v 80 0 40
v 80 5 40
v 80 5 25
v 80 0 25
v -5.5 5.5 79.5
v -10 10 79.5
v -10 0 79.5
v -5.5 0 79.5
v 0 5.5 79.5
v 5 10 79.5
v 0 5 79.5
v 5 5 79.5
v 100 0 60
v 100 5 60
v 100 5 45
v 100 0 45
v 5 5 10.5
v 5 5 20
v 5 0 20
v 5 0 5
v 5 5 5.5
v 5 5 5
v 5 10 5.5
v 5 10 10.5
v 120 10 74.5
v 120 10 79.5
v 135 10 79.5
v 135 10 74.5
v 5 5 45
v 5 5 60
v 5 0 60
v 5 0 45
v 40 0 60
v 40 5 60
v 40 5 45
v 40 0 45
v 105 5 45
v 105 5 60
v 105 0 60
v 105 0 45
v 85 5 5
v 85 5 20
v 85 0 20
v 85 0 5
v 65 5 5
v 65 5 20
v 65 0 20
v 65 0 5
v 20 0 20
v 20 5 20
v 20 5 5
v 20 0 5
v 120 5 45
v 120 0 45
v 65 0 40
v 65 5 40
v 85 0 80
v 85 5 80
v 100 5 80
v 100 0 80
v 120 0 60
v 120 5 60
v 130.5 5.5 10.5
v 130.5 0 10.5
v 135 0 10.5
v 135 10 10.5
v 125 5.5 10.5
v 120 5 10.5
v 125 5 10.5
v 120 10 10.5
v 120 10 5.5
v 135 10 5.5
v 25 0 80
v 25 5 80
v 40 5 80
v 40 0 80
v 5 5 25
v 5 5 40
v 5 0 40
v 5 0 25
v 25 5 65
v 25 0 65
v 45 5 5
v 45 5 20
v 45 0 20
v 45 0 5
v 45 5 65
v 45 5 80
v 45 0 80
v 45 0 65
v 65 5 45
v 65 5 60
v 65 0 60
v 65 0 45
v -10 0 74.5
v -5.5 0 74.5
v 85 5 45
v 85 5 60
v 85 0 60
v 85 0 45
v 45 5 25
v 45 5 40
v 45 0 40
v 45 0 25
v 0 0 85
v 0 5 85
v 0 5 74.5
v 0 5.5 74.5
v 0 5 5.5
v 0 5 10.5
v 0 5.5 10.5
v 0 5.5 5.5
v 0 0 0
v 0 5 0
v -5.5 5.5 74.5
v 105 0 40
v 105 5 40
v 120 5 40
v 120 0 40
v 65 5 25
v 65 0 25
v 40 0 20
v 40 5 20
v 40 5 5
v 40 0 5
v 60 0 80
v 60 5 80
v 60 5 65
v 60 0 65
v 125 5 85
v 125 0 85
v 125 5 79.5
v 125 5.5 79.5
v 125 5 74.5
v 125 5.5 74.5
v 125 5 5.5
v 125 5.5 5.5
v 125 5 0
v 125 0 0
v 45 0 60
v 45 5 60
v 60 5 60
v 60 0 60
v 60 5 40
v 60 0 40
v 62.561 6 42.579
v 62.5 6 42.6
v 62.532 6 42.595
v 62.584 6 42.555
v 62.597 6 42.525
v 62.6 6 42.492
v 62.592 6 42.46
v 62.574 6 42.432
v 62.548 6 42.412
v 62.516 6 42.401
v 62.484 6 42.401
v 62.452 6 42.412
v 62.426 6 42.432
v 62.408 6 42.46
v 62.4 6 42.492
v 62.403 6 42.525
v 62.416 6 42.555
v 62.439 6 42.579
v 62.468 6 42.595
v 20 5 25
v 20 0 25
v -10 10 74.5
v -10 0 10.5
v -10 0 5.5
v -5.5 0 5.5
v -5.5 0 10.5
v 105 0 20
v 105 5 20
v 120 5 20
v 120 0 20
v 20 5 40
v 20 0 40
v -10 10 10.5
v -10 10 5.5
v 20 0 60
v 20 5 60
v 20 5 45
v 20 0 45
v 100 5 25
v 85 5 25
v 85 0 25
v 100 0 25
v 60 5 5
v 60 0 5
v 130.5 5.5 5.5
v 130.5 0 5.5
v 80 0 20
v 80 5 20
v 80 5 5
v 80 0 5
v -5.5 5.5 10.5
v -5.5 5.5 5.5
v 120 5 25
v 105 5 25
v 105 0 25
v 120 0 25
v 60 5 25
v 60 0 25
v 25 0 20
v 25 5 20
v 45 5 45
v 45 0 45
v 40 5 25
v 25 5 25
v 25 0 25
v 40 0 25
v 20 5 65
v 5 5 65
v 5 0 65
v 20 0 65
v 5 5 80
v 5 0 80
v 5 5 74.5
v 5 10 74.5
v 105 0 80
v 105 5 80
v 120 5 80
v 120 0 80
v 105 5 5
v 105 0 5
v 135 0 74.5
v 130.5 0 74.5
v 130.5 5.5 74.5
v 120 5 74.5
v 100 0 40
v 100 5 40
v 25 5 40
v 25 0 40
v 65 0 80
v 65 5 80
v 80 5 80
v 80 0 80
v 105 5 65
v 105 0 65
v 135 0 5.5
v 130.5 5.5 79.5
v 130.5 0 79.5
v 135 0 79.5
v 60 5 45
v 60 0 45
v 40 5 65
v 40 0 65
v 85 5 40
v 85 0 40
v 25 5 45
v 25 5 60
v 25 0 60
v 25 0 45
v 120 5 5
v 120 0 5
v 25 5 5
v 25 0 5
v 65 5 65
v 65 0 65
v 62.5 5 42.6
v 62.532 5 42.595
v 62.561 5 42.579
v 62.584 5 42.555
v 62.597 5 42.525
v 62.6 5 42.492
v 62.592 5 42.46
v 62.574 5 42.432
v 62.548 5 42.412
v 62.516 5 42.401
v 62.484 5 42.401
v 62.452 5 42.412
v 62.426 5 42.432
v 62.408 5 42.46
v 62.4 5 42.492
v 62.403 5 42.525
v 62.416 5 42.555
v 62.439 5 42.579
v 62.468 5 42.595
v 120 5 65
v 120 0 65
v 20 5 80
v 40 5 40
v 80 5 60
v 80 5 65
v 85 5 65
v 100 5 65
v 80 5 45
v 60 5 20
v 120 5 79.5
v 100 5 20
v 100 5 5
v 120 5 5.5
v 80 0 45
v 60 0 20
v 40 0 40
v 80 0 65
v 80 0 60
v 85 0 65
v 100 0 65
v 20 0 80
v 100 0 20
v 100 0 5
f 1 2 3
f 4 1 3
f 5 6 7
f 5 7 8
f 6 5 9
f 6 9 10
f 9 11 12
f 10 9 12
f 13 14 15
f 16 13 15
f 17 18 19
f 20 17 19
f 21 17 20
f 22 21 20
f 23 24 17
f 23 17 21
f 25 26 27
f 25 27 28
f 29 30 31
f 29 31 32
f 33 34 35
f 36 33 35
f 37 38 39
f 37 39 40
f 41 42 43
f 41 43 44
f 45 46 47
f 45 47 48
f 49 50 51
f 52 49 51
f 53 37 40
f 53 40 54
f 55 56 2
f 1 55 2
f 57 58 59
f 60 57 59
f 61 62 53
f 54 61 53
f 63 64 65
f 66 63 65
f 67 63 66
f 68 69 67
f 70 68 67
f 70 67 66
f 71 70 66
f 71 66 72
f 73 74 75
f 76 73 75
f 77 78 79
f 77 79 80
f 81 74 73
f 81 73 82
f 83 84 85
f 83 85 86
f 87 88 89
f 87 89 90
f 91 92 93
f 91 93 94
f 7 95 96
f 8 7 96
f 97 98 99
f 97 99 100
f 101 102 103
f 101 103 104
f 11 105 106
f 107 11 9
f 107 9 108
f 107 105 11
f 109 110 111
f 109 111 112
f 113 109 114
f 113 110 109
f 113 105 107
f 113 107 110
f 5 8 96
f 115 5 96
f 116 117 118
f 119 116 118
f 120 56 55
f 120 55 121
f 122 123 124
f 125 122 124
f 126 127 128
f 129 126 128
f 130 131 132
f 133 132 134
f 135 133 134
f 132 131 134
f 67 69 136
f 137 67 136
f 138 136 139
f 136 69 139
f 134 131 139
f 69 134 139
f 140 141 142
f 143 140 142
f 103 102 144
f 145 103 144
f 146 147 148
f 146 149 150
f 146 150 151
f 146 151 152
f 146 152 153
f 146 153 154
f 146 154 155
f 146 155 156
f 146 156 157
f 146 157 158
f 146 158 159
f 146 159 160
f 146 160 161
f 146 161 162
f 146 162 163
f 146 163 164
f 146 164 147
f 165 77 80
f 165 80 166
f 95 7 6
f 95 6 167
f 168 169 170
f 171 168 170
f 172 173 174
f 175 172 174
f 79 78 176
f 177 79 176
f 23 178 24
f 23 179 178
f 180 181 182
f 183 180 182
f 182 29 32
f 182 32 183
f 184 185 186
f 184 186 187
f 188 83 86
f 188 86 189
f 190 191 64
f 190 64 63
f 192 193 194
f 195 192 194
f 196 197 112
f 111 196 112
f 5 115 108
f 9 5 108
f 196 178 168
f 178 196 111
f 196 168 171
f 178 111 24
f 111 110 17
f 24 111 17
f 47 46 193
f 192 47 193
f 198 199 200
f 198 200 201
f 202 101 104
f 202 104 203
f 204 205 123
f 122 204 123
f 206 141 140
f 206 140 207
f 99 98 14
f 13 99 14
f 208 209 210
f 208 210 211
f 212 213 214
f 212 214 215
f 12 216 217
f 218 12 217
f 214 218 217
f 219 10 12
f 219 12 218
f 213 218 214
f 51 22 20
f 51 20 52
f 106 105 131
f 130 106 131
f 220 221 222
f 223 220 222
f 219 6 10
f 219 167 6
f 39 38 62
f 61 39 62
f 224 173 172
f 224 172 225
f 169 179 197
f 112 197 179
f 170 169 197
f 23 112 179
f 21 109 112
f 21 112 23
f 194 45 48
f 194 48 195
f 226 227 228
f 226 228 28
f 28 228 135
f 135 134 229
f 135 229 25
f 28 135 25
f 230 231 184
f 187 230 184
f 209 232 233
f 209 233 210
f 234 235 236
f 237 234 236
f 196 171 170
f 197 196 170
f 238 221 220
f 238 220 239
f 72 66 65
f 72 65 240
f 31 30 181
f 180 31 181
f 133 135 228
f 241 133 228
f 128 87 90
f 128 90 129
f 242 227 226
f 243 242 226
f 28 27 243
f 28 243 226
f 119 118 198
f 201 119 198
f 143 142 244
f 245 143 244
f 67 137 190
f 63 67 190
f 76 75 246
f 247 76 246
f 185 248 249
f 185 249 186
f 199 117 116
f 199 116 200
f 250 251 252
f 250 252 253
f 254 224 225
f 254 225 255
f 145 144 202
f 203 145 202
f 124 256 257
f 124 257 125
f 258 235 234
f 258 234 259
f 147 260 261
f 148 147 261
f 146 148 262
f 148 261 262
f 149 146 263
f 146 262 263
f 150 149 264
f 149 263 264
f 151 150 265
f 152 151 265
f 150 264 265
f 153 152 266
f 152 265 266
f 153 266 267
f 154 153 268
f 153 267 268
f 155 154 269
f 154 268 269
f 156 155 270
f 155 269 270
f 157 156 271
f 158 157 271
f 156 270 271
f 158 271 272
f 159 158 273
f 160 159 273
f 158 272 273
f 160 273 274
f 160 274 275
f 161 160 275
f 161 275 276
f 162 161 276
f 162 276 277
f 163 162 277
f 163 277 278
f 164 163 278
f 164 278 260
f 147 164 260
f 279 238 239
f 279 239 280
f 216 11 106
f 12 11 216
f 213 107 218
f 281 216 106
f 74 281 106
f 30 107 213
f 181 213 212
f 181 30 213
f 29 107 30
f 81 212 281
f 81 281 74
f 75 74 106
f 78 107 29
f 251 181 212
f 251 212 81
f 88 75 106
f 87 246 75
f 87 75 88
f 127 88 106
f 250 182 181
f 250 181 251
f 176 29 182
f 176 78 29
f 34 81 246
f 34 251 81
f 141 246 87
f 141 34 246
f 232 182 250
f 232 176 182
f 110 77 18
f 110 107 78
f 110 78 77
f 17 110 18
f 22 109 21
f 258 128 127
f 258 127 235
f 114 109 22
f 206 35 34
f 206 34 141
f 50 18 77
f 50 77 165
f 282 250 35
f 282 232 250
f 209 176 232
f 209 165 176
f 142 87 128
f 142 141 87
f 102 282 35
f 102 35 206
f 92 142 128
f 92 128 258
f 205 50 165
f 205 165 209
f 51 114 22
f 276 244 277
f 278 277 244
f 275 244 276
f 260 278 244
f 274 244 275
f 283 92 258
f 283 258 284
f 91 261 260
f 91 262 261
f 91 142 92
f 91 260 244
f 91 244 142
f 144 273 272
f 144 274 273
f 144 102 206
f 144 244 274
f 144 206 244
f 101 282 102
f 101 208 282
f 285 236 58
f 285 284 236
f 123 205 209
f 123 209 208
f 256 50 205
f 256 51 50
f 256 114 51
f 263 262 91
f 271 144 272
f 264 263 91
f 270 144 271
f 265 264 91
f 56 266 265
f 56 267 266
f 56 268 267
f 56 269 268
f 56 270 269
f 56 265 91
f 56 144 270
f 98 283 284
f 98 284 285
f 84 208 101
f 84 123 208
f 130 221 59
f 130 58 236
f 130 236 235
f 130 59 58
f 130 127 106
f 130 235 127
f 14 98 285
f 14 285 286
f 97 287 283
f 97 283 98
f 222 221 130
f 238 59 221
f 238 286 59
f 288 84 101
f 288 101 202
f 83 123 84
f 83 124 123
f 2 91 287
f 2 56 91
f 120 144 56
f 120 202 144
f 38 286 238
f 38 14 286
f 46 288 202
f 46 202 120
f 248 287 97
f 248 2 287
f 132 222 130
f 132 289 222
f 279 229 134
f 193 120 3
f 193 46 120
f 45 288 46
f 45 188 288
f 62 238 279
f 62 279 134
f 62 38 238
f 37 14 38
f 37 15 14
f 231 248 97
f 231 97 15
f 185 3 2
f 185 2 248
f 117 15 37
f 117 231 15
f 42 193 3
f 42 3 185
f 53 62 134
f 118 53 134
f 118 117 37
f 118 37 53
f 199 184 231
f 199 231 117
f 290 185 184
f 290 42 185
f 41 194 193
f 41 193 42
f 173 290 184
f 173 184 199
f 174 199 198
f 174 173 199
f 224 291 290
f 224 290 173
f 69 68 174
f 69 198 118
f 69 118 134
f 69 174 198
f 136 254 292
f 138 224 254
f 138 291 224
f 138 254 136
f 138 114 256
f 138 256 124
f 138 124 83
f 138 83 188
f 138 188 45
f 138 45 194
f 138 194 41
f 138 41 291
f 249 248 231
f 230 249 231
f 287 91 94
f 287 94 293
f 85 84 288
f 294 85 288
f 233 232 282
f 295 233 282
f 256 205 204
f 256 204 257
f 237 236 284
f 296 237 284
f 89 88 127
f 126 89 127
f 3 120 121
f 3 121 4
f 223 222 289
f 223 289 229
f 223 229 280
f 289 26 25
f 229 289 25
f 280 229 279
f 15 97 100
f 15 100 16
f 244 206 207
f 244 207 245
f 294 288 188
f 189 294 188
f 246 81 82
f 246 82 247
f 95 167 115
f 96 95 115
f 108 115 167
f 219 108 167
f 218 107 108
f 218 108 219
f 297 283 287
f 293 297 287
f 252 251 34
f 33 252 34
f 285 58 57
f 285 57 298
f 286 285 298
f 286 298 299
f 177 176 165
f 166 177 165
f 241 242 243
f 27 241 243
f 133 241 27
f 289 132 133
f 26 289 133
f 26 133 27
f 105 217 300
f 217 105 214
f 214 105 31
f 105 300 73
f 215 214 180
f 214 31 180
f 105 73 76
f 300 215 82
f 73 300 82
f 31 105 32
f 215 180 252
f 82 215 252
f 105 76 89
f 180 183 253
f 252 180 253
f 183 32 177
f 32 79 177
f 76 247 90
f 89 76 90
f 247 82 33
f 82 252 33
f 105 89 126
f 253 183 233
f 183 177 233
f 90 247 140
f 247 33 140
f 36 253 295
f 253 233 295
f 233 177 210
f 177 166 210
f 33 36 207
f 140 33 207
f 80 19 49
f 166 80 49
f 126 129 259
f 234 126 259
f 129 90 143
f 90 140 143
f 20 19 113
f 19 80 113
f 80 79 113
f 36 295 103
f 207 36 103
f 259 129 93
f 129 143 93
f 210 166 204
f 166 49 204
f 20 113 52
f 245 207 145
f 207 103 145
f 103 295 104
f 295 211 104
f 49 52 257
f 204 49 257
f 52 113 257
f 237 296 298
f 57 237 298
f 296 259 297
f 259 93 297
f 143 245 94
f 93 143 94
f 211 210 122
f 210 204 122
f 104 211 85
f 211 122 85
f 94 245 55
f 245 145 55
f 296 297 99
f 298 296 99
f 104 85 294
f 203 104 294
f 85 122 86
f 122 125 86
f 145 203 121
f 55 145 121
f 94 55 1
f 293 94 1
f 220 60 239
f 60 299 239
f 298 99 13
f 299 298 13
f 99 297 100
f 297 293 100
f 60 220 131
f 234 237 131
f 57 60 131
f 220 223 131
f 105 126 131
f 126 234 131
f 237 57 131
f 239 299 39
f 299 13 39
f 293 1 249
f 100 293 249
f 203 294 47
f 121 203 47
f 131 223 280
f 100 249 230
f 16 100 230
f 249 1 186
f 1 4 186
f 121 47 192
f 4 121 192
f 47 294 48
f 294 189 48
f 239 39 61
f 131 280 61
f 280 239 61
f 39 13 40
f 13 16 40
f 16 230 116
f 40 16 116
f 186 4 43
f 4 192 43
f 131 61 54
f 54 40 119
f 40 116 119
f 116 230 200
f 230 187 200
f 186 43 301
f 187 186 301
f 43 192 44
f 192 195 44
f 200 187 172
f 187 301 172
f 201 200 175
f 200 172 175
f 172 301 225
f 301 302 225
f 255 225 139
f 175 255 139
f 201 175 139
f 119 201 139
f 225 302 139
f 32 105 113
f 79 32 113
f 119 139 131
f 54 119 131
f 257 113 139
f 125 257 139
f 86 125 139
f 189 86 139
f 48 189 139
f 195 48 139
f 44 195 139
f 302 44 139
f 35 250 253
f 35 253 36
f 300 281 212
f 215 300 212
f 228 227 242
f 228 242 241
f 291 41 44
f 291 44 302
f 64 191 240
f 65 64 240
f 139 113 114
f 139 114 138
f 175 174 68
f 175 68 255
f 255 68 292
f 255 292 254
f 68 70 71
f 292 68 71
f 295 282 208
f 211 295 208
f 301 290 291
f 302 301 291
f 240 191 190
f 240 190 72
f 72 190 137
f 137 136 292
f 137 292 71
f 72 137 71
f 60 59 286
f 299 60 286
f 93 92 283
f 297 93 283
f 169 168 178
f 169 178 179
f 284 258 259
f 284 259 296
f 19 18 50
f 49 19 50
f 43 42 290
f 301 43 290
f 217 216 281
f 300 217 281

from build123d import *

# Parameters (mm, degrees)
SKETCH_1_W                     = 125
SKETCH_1_H                     = 85
EXTRUDE_1_DEPTH                = 5
SKETCH_2_W                     = 15
SKETCH_2_H                     = 15
CUT_EXTRUDE_1_DEPTH            = 5
PATTERN_LINEAR_1_COUNT         = 6
PATTERN_LINEAR_1_PITCH         = 20
PATTERN_LINEAR_1_COUNT_DIR2    = 4
PATTERN_LINEAR_1_PITCH_DIR2    = 20
EXTRUDE_START                  = -5
SKETCH_3_W                     = 5
SKETCH_3_H                     = 10
EXTRUDE_2_DEPTH                = 15
PATTERN_LINEAR_2_COUNT         = 2
PATTERN_LINEAR_2_PITCH         = 69
CUT_EXTRUDE_START              = -15
SKETCH_5_W                     = 5.5
SKETCH_5_H                     = 5.5
CUT_EXTRUDE_3_DEPTH            = 125
SKETCH_9_R                     = 0.1
EXTRUDE_3_DEPTH                = 1
PATTERN_CIRCULAR_1_OUTLINE_W   = 4.5
PATTERN_CIRCULAR_1_OUTLINE_H   = 5
PATTERN_CIRCULAR_1_OUTLINE_W_2 = 5
PATTERN_CIRCULAR_1_DEPTH       = 10
PATTERN_START                  = 5.5
PATTERN_CIRCULAR_1_2_OUTLINE_W = 5.5
PATTERN_CIRCULAR_1_2_OUTLINE_H = 5
PATTERN_CIRCULAR_1_2_DEPTH     = 4.5


# Read off the part's stored shape, not the designer's step: 阵列(圆周)1
with BuildPart() as part:
    # 草图1 → 凸台-拉伸1 (new body)
    with BuildSketch(Plane(origin=(0, 0, 0), x_dir=(1, 0, 0), z_dir=(0, 1, 0))):
        with Locations((62.5, -42.5)):
            Rectangle(SKETCH_1_W, SKETCH_1_H)
    extrude(amount=EXTRUDE_1_DEPTH)

    # 草图2 → 切除-拉伸1 (cut)
    with BuildSketch(Plane(origin=(0, 5, 0), x_dir=(1, 0, 0), z_dir=(0, 1, 0))):
        with Locations((12.5, -12.5)):
            Rectangle(SKETCH_2_W, SKETCH_2_H)
    cut_extrude_1 = extrude(amount=-CUT_EXTRUDE_1_DEPTH, mode=Mode.SUBTRACT)

    # 阵列(线性)1: Cut-Extrude 1 6 × 4
    with Locations(*[(i * PATTERN_LINEAR_1_PITCH, 0, j * PATTERN_LINEAR_1_PITCH_DIR2) for i in range(PATTERN_LINEAR_1_COUNT) for j in range(PATTERN_LINEAR_1_COUNT_DIR2) if (i, j) != (0, 0)]):
        add(cut_extrude_1, mode=Mode.SUBTRACT)

    # 草图3 → 凸台-拉伸2 (add)
    with BuildSketch(Plane(origin=(125, 0, 0), x_dir=(0, 0, -1), z_dir=(1, 0, 0)).offset(EXTRUDE_START)):
        with Locations((-8, 5)):
            Rectangle(SKETCH_3_W, SKETCH_3_H)
    extrude_2 = extrude(amount=EXTRUDE_2_DEPTH)

    # 阵列(线性)2: 凸台-拉伸2 ×2
    with Locations(*[(0, 0, i * PATTERN_LINEAR_2_PITCH) for i in range(1, PATTERN_LINEAR_2_COUNT)]):
        add(extrude_2)

    # 草图5 → 切除-拉伸3 (cut)
    with BuildSketch(Plane.XY.offset(10.5).offset(CUT_EXTRUDE_START)):
        with Locations((127.75, 2.75)):
            Rectangle(SKETCH_5_W, SKETCH_5_H)
    extrude(amount=CUT_EXTRUDE_3_DEPTH, mode=Mode.SUBTRACT)

    # 草图9 → 凸台-拉伸3 (add)
    with BuildSketch(Plane(origin=(0, 5, 0), x_dir=(1, 0, 0), z_dir=(0, 1, 0))):
        with Locations(Location((62.5, -42.5, 0), (0, 0, 270))):
            Circle(SKETCH_9_R)
    extrude(amount=EXTRUDE_3_DEPTH)

    # 阵列(圆周)1 outline → 阵列(圆周)1 (add)
    with BuildSketch(Plane(origin=(0, 0, 0), x_dir=(1, 0, 0), z_dir=(0, 1, 0))):
        with Locations((-7.75, -77)):
            Rectangle(PATTERN_CIRCULAR_1_OUTLINE_W, PATTERN_CIRCULAR_1_OUTLINE_H)
        with Locations((2.5, -8)):
            Rectangle(PATTERN_CIRCULAR_1_OUTLINE_W_2, PATTERN_CIRCULAR_1_OUTLINE_H)
        with Locations((2.5, -77)):
            Rectangle(PATTERN_CIRCULAR_1_OUTLINE_W_2, PATTERN_CIRCULAR_1_OUTLINE_H)
        with Locations((-7.75, -8)):
            Rectangle(PATTERN_CIRCULAR_1_OUTLINE_W, PATTERN_CIRCULAR_1_OUTLINE_H)
    extrude(amount=PATTERN_CIRCULAR_1_DEPTH)

    # Pattern Circular 1 2 outline → Pattern Circular 1 2 (add)
    with BuildSketch(Plane(origin=(0, 0, 0), x_dir=(1, 0, 0), z_dir=(0, 1, 0)).offset(PATTERN_START)):
        with Locations((-2.75, -8)):
            Rectangle(PATTERN_CIRCULAR_1_2_OUTLINE_W, PATTERN_CIRCULAR_1_2_OUTLINE_H)
        with Locations((-2.75, -77)):
            Rectangle(PATTERN_CIRCULAR_1_2_OUTLINE_W, PATTERN_CIRCULAR_1_2_OUTLINE_H)
    extrude(amount=PATTERN_CIRCULAR_1_2_DEPTH)


solid = part.part
